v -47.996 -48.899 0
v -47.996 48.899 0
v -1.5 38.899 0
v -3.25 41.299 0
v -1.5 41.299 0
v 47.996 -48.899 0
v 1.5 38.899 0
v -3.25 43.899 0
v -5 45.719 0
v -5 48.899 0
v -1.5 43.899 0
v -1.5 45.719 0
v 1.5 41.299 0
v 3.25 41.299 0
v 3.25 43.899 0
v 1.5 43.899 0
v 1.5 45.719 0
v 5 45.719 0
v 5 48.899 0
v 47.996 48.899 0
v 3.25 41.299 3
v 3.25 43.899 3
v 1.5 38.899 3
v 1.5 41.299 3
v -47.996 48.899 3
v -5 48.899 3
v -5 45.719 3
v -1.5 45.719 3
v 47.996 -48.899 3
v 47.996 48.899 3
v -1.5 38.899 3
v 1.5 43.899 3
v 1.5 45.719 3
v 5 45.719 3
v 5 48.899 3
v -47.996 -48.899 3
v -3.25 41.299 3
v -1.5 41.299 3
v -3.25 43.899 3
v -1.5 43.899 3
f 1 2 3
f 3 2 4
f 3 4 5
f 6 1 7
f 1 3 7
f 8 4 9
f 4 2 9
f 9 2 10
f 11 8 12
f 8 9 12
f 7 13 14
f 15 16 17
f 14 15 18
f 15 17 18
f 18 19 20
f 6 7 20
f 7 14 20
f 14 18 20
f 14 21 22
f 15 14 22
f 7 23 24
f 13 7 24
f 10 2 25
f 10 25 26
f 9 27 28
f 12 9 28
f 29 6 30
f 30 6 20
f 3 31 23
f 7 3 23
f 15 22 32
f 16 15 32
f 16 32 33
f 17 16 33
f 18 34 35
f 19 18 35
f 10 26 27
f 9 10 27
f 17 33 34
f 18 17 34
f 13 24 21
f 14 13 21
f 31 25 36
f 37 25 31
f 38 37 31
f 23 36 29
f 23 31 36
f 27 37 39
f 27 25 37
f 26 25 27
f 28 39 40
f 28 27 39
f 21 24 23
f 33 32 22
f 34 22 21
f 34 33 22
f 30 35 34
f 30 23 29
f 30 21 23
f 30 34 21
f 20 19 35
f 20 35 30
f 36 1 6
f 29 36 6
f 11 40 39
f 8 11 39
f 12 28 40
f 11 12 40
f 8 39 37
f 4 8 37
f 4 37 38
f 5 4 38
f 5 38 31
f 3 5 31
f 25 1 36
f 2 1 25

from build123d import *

# Parameters (mm, degrees)
SKETCH1_W           = 95.992410468
SKETCH1_H           = 97.798719266
BOSS_EXTRUDE1_DEPTH = 3
CUT_EXTRUDE1_DEPTH  = 4


with BuildPart() as part:
    # Sketch1 → Boss-Extrude1 (new body)
    with BuildSketch(Plane.XY):
        Rectangle(SKETCH1_W, SKETCH1_H)
    extrude(amount=BOSS_EXTRUDE1_DEPTH)

    # Sketch2 → Cut-Extrude1 (cut, through all)
    with BuildSketch(Plane.XY.offset(3)):
        Polygon((1.5, 45.719359633), (5, 45.719359633), (5, 48.899359633), (-5, 48.899359633), (-5, 45.719359633), (-1.5, 45.719359633), (-1.5, 43.899359633), (-3.25, 43.899359633), (-3.25, 41.299359633), (-1.5, 41.299359633), (-1.5, 38.899359633), (1.5, 38.899359633), (1.5, 41.299359633), (3.25, 41.299359633), (3.25, 43.899359633), (1.5, 43.899359633), align=None)
    extrude(amount=-CUT_EXTRUDE1_DEPTH, mode=Mode.SUBTRACT)


solid = part.part
